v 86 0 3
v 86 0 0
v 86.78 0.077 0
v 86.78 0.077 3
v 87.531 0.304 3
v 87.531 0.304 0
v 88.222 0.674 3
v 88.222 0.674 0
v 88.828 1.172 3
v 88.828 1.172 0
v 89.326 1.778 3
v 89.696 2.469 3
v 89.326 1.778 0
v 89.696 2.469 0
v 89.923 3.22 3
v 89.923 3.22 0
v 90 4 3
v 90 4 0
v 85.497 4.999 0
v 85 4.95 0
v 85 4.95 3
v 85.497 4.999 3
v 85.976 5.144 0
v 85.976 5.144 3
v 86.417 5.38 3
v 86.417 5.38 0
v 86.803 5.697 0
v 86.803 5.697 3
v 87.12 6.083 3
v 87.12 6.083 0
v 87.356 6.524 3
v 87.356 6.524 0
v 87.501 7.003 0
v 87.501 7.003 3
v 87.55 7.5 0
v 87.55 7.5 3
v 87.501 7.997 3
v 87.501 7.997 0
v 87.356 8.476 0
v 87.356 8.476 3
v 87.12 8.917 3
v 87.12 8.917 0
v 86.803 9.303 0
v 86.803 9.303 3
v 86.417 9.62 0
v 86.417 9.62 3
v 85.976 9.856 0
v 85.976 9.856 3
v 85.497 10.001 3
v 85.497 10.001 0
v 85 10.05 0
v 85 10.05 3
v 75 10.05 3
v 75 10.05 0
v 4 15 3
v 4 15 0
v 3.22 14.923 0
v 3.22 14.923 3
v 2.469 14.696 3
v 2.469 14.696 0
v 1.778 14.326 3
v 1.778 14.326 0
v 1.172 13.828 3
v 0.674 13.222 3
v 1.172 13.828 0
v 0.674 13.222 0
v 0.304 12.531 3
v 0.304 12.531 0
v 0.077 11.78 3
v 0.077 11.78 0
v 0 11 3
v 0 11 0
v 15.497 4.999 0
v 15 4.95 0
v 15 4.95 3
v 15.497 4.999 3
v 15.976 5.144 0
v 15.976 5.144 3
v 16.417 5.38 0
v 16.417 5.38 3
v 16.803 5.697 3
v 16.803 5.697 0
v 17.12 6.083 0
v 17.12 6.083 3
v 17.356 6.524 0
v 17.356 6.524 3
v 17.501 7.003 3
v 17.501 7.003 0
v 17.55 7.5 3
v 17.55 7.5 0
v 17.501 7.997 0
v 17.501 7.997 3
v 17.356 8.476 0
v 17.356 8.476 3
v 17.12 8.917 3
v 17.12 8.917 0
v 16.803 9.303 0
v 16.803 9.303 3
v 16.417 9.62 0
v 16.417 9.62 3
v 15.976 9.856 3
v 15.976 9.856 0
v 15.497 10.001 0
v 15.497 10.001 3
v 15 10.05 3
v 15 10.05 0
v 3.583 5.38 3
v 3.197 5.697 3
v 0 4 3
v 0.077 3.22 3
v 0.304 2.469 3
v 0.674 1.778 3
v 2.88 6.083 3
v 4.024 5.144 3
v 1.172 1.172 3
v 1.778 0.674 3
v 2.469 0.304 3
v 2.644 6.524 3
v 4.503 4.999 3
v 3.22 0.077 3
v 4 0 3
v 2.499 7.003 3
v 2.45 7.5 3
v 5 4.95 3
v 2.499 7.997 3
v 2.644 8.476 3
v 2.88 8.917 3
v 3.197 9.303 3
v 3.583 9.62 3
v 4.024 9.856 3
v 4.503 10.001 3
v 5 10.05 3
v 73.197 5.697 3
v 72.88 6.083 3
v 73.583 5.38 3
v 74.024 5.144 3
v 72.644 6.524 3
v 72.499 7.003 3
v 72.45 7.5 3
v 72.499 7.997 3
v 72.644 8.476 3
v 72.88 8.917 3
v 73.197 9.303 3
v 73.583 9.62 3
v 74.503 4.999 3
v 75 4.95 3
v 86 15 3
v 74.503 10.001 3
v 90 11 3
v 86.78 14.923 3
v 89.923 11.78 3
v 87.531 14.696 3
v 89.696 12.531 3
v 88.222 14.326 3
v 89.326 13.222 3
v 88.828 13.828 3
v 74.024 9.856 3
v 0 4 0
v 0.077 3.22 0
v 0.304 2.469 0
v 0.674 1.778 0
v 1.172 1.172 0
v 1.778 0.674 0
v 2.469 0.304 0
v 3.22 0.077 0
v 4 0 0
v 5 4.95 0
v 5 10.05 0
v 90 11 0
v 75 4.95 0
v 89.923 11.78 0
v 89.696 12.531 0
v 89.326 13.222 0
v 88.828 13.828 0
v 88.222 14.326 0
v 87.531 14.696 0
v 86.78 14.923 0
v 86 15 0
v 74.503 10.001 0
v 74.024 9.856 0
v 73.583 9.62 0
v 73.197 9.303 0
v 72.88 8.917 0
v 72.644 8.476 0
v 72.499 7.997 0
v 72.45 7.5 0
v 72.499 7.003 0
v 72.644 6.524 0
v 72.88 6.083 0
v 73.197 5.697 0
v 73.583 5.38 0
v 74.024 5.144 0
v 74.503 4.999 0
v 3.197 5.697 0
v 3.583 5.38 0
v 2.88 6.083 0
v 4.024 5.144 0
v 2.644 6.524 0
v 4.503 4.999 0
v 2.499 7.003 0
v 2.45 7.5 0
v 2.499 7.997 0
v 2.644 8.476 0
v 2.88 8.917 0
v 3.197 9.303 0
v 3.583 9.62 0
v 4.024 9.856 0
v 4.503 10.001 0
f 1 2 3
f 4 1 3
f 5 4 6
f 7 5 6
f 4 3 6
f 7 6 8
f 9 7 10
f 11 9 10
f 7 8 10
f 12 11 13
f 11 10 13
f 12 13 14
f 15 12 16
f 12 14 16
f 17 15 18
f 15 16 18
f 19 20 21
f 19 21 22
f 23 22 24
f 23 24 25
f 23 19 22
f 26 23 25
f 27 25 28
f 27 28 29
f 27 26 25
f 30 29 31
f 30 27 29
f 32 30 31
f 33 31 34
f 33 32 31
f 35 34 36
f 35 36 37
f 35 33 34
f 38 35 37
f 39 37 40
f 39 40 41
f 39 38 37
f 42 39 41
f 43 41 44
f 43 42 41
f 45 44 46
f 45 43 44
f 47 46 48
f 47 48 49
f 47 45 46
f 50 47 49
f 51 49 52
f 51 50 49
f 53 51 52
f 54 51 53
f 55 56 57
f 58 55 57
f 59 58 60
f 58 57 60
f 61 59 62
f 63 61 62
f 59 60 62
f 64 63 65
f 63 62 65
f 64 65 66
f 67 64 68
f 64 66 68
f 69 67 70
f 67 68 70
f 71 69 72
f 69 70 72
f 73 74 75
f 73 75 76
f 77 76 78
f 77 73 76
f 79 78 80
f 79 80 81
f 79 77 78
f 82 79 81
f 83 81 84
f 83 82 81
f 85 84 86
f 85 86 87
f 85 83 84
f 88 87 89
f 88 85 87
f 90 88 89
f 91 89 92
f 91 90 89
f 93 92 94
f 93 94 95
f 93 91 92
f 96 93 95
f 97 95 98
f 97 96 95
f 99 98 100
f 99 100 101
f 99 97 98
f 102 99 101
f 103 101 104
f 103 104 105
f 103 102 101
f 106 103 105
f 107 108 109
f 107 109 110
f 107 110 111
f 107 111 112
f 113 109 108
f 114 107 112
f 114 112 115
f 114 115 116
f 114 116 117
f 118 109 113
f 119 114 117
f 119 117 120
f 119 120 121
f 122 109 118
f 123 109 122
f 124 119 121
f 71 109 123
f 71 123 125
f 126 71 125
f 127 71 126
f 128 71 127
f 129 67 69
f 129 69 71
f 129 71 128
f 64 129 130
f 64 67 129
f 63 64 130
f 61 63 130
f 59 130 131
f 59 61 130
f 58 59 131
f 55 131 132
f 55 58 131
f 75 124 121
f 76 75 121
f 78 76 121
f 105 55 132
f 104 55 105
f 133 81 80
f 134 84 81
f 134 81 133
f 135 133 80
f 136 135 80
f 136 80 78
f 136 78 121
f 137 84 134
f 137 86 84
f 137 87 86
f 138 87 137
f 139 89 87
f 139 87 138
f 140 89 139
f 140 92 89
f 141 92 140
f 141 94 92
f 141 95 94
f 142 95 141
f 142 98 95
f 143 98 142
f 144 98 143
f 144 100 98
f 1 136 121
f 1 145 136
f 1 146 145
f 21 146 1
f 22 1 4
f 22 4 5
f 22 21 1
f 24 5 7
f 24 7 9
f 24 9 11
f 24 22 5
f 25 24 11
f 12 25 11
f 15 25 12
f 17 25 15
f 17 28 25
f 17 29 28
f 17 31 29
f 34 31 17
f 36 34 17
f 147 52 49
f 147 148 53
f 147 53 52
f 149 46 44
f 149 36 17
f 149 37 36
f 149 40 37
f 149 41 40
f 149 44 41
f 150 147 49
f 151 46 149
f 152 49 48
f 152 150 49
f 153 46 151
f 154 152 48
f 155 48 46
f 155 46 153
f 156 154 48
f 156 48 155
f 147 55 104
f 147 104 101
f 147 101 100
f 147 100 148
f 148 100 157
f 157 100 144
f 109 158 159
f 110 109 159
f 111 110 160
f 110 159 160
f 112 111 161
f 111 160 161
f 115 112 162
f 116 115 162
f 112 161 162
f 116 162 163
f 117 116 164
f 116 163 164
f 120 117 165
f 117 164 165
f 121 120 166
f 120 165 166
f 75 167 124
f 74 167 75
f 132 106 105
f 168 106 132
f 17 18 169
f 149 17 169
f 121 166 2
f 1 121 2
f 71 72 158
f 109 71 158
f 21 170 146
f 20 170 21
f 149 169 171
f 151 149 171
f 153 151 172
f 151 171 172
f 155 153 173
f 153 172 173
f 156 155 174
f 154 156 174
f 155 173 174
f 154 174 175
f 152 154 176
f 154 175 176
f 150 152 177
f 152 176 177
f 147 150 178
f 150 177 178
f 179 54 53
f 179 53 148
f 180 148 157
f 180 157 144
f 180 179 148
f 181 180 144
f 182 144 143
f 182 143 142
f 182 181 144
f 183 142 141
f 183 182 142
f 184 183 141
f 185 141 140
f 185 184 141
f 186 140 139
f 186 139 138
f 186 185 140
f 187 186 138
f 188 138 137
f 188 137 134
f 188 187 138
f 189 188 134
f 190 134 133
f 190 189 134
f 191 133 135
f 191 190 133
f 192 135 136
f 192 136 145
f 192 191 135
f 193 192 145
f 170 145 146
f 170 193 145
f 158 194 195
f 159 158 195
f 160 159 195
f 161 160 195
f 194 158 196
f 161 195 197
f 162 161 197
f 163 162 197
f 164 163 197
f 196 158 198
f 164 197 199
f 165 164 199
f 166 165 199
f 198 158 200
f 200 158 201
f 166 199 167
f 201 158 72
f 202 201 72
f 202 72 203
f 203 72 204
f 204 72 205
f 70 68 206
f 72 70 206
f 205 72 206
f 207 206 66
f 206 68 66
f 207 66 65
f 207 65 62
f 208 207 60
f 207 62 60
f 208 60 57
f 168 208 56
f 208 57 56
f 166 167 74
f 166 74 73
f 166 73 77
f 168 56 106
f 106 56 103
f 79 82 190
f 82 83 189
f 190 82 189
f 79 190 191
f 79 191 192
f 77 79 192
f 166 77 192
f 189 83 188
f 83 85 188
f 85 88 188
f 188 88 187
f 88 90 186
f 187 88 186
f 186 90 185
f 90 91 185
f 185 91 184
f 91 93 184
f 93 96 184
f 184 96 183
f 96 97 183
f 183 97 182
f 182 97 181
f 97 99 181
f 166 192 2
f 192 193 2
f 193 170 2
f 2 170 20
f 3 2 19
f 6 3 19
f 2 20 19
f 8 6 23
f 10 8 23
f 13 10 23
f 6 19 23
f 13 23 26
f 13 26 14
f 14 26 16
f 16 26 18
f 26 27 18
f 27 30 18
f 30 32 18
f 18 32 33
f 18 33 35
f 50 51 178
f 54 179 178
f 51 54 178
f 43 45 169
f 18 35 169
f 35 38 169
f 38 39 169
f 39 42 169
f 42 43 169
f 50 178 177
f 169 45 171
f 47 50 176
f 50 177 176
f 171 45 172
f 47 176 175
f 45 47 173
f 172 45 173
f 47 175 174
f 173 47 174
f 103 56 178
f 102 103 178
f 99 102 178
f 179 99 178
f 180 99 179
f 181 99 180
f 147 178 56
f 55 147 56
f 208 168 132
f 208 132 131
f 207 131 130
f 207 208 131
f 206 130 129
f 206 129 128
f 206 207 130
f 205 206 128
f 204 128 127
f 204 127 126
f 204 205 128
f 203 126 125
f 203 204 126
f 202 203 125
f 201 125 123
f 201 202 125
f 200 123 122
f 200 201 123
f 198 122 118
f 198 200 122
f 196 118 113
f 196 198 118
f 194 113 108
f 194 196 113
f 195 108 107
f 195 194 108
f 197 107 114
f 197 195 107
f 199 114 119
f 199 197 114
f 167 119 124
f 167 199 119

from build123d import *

# Parameters (mm, degrees)
AUFSATZ_LINEAR_AUSTRAGEN1_DEPTH = 3


with BuildPart() as part:
    # Model → Aufsatz-Linear austragen1 (new body)
    with BuildSketch(Plane.XY):
        with BuildLine():
            Line((4, 0), (86, 0))
            ThreePointArc((86, 0), (88.828427125, 1.171572875), (90, 4))
            Line((90, 4), (90, 11))
            ThreePointArc((90, 11), (88.828427125, 13.828427125), (86, 15))
            Line((86, 15), (4, 15))
            ThreePointArc((4, 15), (1.171572875, 13.828427125), (0, 11))
            Line((0, 11), (0, 4))
            ThreePointArc((0, 4), (1.171572875, 1.171572875), (4, 0))
        make_face()
        with BuildLine():
            Line((5, 4.95), (15, 4.95))
            ThreePointArc((15, 4.95), (17.55, 7.5), (15, 10.05))
            Line((15, 10.05), (5, 10.05))
            ThreePointArc((5, 10.05), (2.45, 7.5), (5, 4.95))
        make_face(mode=Mode.SUBTRACT)
        with BuildLine():
            Line((75, 4.95), (85, 4.95))
            ThreePointArc((85, 4.95), (87.55, 7.5), (85, 10.05))
            Line((85, 10.05), (75, 10.05))
            ThreePointArc((75, 10.05), (72.45, 7.5), (75, 4.95))
        make_face(mode=Mode.SUBTRACT)
    extrude(amount=AUFSATZ_LINEAR_AUSTRAGEN1_DEPTH)


solid = part.part
